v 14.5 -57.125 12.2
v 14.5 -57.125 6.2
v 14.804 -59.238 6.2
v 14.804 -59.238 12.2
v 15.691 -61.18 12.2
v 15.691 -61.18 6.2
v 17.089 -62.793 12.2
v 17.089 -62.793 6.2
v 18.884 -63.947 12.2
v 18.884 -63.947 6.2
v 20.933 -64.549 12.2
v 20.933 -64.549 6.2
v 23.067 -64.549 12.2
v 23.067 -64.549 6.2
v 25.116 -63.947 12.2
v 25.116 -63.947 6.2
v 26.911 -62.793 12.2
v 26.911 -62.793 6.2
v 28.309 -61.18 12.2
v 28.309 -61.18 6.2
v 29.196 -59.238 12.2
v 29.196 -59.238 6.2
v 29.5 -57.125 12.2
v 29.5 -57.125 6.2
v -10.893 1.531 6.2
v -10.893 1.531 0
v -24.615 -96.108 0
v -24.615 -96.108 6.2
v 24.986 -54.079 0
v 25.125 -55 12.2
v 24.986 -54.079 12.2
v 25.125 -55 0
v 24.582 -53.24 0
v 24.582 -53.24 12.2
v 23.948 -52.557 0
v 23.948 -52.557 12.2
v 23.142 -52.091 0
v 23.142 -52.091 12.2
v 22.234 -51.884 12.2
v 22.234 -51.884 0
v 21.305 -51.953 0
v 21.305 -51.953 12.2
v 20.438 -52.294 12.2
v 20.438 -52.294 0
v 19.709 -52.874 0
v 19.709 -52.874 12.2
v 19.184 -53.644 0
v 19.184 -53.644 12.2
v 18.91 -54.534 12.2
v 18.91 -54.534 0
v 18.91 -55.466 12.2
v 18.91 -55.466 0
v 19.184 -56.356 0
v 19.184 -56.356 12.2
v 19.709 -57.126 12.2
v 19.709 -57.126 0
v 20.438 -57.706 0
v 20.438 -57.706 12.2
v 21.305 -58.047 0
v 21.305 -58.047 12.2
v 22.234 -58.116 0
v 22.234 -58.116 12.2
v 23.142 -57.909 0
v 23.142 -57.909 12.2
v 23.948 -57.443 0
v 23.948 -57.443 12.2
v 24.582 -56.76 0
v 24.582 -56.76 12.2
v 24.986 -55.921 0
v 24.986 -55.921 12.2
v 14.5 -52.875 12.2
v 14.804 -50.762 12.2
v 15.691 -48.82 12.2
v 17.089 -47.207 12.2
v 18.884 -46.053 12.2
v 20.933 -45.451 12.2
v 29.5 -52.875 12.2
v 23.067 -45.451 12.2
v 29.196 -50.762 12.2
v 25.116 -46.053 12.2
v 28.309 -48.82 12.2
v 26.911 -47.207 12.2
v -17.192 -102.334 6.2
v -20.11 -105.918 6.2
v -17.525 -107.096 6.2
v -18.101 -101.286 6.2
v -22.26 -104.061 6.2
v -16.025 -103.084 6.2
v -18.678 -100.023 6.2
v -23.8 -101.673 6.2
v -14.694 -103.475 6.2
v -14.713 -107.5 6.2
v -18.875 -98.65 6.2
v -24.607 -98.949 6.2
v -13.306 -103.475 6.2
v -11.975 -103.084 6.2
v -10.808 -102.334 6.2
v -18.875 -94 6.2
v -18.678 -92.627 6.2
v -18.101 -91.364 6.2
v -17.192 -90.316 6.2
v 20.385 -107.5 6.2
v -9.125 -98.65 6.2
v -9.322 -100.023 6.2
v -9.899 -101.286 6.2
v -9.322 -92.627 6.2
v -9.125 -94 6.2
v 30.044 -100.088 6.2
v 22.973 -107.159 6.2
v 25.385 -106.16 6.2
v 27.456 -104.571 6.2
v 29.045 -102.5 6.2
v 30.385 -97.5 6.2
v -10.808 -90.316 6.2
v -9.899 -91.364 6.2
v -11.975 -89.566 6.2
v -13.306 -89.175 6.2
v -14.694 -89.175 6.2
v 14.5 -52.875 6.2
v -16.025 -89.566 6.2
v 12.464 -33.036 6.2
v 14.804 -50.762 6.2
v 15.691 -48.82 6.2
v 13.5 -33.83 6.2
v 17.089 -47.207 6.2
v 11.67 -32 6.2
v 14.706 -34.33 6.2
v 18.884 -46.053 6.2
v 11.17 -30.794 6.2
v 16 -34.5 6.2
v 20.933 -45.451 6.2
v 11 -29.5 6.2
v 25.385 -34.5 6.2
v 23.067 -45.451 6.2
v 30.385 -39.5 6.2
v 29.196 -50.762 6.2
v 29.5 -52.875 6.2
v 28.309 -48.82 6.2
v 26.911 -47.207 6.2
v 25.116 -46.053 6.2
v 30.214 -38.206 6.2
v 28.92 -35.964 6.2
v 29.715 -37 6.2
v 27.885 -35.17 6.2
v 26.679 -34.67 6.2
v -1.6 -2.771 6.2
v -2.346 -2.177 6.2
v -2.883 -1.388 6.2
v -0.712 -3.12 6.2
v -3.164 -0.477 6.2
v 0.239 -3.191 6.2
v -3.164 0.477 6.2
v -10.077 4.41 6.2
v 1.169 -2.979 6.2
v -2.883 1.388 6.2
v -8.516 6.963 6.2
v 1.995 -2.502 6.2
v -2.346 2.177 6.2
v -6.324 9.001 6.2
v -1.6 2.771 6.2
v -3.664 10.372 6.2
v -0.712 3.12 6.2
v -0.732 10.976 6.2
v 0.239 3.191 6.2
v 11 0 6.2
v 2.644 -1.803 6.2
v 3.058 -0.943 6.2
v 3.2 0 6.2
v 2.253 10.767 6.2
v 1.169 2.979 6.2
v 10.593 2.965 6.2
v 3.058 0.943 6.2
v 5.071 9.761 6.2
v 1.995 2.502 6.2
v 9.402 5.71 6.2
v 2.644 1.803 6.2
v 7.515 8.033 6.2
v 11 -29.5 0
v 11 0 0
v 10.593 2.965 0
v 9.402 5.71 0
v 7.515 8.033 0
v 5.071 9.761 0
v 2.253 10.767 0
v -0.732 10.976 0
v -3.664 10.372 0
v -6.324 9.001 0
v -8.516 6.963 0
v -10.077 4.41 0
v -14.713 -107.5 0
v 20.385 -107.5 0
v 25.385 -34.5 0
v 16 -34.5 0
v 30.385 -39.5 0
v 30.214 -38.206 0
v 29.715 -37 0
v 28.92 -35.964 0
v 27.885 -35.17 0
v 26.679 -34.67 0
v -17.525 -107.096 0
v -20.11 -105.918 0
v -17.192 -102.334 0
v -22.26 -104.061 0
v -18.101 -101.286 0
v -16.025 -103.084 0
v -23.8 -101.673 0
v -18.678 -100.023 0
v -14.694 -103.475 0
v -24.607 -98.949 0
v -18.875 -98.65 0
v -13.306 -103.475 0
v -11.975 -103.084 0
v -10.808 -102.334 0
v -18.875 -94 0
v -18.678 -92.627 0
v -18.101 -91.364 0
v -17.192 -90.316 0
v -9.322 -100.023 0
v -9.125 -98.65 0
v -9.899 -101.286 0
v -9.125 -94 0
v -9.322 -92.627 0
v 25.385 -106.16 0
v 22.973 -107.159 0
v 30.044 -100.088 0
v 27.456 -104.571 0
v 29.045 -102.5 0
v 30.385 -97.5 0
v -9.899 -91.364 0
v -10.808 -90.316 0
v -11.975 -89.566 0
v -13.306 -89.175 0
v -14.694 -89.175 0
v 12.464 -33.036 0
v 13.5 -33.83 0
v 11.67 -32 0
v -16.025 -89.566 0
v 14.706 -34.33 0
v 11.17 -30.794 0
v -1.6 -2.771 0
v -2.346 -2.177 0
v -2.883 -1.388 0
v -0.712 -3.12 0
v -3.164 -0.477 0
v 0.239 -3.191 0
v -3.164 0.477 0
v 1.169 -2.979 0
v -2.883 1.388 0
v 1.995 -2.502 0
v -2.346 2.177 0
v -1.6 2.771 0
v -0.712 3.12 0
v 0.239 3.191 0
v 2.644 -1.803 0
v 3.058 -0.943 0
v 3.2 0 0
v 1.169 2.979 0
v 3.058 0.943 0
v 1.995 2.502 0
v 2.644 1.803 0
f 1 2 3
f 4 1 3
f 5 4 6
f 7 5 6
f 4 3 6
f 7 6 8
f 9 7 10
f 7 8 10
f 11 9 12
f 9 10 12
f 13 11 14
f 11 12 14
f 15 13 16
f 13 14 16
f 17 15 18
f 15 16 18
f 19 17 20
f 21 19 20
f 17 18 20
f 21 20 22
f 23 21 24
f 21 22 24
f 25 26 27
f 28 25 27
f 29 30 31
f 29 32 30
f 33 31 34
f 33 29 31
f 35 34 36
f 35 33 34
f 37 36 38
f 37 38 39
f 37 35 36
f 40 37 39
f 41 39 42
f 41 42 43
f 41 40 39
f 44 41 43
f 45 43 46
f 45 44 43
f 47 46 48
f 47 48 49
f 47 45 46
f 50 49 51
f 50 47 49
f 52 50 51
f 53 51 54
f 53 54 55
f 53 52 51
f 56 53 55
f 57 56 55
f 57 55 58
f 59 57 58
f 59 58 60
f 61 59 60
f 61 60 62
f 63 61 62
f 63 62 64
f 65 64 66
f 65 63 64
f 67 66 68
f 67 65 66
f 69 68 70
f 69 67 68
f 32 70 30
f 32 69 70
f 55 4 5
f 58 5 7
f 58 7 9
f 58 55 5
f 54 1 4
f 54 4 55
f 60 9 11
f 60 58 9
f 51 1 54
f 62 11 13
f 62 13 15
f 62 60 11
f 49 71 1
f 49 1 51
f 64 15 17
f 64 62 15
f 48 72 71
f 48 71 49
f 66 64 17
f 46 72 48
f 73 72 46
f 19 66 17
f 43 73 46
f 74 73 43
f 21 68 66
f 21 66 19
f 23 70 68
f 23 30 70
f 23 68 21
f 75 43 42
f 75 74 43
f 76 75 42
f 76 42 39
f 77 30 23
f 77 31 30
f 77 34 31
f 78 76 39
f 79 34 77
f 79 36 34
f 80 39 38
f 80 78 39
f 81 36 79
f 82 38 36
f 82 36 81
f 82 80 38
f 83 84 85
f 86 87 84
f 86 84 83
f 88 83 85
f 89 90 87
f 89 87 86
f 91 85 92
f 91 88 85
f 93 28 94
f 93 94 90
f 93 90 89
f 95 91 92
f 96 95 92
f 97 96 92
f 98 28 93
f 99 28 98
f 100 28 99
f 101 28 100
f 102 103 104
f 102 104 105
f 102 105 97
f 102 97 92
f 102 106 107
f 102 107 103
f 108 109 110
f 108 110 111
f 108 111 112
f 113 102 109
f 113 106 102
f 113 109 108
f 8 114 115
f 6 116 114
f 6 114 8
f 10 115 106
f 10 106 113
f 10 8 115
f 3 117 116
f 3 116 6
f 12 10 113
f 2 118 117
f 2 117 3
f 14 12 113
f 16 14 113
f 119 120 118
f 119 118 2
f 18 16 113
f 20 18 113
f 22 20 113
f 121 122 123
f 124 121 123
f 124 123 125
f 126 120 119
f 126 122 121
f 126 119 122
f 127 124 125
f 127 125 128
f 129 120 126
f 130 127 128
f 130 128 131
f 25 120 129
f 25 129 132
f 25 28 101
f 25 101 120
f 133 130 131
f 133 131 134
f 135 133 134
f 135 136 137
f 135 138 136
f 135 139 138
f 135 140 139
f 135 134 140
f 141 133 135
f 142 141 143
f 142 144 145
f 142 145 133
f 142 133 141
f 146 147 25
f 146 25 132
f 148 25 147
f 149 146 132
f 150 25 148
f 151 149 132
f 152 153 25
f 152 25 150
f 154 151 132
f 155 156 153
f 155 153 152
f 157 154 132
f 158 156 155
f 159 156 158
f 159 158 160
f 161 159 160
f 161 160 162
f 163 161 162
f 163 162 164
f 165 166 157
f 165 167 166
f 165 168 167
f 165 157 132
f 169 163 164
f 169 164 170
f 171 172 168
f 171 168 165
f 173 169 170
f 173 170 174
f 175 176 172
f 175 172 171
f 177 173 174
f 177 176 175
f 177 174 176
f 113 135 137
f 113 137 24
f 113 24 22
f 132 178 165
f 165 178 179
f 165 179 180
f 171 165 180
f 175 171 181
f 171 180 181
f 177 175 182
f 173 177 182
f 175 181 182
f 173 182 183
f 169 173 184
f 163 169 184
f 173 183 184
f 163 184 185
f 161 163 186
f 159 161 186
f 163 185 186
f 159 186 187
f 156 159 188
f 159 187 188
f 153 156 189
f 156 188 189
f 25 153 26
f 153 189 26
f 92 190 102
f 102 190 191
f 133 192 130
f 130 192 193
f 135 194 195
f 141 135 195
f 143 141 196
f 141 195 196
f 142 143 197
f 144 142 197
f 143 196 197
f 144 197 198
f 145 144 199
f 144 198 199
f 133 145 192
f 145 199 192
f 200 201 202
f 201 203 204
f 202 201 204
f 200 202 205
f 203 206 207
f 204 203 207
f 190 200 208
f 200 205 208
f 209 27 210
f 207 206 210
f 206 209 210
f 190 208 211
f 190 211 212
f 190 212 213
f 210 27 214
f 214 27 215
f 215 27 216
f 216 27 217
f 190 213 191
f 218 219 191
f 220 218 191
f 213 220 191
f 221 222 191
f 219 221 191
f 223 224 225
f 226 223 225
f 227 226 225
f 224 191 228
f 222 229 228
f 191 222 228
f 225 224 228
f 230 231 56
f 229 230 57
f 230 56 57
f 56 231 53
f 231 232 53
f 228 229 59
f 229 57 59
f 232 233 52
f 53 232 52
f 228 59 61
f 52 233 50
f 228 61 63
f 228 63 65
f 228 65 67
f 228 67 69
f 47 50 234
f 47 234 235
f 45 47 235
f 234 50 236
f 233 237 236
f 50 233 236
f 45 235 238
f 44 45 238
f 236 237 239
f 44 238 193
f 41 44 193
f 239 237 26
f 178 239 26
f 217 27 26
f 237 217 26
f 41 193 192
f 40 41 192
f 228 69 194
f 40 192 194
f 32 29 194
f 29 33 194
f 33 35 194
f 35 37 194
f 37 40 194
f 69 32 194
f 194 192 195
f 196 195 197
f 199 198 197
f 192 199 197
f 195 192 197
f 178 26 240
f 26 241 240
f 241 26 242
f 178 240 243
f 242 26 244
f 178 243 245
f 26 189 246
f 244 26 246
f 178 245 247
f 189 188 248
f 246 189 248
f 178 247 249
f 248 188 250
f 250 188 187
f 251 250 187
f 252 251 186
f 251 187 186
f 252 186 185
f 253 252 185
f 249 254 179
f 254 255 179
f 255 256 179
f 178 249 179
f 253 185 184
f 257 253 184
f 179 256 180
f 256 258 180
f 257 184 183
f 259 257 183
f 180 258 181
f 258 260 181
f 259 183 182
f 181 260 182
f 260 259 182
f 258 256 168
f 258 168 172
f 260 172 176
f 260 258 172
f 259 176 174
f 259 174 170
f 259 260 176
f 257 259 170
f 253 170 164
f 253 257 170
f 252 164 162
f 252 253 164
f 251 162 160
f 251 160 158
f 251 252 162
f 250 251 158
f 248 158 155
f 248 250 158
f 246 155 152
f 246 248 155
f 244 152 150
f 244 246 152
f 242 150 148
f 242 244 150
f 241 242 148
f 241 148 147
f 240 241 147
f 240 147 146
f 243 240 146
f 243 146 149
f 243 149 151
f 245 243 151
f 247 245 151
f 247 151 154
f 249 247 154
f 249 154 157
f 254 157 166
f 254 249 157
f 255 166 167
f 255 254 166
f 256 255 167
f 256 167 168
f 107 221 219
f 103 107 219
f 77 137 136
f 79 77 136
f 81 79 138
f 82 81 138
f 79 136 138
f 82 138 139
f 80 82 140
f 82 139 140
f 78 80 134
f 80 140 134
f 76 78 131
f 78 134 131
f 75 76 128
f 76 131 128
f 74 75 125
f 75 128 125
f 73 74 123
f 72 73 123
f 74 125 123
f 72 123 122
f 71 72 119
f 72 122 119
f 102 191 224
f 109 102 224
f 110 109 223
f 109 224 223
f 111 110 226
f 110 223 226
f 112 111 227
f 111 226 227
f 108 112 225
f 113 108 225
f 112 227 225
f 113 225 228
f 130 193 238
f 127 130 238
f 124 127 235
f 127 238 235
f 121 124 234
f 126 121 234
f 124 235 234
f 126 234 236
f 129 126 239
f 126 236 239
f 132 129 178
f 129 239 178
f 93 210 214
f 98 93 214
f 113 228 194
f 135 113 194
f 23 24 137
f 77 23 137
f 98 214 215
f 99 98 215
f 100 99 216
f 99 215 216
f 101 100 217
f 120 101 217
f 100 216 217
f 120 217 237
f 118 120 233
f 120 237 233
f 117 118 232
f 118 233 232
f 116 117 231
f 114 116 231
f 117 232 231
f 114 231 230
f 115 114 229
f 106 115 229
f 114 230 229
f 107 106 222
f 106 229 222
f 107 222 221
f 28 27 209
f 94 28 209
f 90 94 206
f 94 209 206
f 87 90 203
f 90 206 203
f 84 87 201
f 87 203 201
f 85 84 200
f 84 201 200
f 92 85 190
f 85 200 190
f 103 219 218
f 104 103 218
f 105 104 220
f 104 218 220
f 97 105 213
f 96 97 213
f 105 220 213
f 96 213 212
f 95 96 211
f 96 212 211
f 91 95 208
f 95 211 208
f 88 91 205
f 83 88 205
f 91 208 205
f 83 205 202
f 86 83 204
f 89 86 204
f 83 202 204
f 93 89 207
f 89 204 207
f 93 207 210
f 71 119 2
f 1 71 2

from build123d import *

# Parameters (mm, degrees)
F0_R     = 3.125
F0_R_2   = 3.2
F1_DEPTH = 6.2
F2_R     = 3.125
F3_DEPTH = 6


with BuildPart() as f1:
    # F0 (on Top) → F1 (new body)
    with BuildSketch(Plane.XY):
        with BuildLine():
            Line((11, -29.5), (11, 0))
            ThreePointArc((11, 0), (0.767321, 10.973205), (-10.892949, 1.530904))
            Line((-10.892949, 1.530904), (-24.61524, -96.108269))
            ThreePointArc((-24.61524, -96.108269), (-22.259655, -104.06059), (-14.712559, -107.5))
            Line((-14.712559, -107.5), (20.38476, -107.5))
            ThreePointArc((20.38476, -107.5), (27.455828, -104.571068), (30.38476, -97.5))
            Line((30.38476, -97.5), (30.38476, -39.5))
            ThreePointArc((30.38476, -39.5), (28.920294, -35.964466), (25.38476, -34.5))
            Line((25.38476, -34.5), (16, -34.5))
            ThreePointArc((16, -34.5), (12.464466, -33.035534), (11, -29.5))
        make_face()
        with BuildLine():
            Line((-18.875, -98.65), (-18.875, -94))
            ThreePointArc((-18.875, -94), (-14, -89.125), (-9.125, -94))
            Line((-9.125, -94), (-9.125, -98.65))
            ThreePointArc((-9.125, -98.65), (-14, -103.525), (-18.875, -98.65))
        make_face(mode=Mode.SUBTRACT)
        with Locations((22, -55)):
            Circle(F0_R, mode=Mode.SUBTRACT)
        Circle(F0_R_2, mode=Mode.SUBTRACT)
    extrude(amount=F1_DEPTH)

    # F2 (on face) → F3 (join)
    with BuildSketch(Plane.XY.offset(6.2)):
        with BuildLine():
            ThreePointArc((29.5, -52.875), (22, -45.375), (14.5, -52.875))
            Line((14.5, -52.875), (14.5, -57.125))
            ThreePointArc((14.5, -57.125), (22, -64.625), (29.5, -57.125))
            Line((29.5, -57.125), (29.5, -52.875))
        make_face()
        with Locations((22, -55)):
            Circle(F2_R, mode=Mode.SUBTRACT)
    extrude(amount=F3_DEPTH)


solid = f1.part
